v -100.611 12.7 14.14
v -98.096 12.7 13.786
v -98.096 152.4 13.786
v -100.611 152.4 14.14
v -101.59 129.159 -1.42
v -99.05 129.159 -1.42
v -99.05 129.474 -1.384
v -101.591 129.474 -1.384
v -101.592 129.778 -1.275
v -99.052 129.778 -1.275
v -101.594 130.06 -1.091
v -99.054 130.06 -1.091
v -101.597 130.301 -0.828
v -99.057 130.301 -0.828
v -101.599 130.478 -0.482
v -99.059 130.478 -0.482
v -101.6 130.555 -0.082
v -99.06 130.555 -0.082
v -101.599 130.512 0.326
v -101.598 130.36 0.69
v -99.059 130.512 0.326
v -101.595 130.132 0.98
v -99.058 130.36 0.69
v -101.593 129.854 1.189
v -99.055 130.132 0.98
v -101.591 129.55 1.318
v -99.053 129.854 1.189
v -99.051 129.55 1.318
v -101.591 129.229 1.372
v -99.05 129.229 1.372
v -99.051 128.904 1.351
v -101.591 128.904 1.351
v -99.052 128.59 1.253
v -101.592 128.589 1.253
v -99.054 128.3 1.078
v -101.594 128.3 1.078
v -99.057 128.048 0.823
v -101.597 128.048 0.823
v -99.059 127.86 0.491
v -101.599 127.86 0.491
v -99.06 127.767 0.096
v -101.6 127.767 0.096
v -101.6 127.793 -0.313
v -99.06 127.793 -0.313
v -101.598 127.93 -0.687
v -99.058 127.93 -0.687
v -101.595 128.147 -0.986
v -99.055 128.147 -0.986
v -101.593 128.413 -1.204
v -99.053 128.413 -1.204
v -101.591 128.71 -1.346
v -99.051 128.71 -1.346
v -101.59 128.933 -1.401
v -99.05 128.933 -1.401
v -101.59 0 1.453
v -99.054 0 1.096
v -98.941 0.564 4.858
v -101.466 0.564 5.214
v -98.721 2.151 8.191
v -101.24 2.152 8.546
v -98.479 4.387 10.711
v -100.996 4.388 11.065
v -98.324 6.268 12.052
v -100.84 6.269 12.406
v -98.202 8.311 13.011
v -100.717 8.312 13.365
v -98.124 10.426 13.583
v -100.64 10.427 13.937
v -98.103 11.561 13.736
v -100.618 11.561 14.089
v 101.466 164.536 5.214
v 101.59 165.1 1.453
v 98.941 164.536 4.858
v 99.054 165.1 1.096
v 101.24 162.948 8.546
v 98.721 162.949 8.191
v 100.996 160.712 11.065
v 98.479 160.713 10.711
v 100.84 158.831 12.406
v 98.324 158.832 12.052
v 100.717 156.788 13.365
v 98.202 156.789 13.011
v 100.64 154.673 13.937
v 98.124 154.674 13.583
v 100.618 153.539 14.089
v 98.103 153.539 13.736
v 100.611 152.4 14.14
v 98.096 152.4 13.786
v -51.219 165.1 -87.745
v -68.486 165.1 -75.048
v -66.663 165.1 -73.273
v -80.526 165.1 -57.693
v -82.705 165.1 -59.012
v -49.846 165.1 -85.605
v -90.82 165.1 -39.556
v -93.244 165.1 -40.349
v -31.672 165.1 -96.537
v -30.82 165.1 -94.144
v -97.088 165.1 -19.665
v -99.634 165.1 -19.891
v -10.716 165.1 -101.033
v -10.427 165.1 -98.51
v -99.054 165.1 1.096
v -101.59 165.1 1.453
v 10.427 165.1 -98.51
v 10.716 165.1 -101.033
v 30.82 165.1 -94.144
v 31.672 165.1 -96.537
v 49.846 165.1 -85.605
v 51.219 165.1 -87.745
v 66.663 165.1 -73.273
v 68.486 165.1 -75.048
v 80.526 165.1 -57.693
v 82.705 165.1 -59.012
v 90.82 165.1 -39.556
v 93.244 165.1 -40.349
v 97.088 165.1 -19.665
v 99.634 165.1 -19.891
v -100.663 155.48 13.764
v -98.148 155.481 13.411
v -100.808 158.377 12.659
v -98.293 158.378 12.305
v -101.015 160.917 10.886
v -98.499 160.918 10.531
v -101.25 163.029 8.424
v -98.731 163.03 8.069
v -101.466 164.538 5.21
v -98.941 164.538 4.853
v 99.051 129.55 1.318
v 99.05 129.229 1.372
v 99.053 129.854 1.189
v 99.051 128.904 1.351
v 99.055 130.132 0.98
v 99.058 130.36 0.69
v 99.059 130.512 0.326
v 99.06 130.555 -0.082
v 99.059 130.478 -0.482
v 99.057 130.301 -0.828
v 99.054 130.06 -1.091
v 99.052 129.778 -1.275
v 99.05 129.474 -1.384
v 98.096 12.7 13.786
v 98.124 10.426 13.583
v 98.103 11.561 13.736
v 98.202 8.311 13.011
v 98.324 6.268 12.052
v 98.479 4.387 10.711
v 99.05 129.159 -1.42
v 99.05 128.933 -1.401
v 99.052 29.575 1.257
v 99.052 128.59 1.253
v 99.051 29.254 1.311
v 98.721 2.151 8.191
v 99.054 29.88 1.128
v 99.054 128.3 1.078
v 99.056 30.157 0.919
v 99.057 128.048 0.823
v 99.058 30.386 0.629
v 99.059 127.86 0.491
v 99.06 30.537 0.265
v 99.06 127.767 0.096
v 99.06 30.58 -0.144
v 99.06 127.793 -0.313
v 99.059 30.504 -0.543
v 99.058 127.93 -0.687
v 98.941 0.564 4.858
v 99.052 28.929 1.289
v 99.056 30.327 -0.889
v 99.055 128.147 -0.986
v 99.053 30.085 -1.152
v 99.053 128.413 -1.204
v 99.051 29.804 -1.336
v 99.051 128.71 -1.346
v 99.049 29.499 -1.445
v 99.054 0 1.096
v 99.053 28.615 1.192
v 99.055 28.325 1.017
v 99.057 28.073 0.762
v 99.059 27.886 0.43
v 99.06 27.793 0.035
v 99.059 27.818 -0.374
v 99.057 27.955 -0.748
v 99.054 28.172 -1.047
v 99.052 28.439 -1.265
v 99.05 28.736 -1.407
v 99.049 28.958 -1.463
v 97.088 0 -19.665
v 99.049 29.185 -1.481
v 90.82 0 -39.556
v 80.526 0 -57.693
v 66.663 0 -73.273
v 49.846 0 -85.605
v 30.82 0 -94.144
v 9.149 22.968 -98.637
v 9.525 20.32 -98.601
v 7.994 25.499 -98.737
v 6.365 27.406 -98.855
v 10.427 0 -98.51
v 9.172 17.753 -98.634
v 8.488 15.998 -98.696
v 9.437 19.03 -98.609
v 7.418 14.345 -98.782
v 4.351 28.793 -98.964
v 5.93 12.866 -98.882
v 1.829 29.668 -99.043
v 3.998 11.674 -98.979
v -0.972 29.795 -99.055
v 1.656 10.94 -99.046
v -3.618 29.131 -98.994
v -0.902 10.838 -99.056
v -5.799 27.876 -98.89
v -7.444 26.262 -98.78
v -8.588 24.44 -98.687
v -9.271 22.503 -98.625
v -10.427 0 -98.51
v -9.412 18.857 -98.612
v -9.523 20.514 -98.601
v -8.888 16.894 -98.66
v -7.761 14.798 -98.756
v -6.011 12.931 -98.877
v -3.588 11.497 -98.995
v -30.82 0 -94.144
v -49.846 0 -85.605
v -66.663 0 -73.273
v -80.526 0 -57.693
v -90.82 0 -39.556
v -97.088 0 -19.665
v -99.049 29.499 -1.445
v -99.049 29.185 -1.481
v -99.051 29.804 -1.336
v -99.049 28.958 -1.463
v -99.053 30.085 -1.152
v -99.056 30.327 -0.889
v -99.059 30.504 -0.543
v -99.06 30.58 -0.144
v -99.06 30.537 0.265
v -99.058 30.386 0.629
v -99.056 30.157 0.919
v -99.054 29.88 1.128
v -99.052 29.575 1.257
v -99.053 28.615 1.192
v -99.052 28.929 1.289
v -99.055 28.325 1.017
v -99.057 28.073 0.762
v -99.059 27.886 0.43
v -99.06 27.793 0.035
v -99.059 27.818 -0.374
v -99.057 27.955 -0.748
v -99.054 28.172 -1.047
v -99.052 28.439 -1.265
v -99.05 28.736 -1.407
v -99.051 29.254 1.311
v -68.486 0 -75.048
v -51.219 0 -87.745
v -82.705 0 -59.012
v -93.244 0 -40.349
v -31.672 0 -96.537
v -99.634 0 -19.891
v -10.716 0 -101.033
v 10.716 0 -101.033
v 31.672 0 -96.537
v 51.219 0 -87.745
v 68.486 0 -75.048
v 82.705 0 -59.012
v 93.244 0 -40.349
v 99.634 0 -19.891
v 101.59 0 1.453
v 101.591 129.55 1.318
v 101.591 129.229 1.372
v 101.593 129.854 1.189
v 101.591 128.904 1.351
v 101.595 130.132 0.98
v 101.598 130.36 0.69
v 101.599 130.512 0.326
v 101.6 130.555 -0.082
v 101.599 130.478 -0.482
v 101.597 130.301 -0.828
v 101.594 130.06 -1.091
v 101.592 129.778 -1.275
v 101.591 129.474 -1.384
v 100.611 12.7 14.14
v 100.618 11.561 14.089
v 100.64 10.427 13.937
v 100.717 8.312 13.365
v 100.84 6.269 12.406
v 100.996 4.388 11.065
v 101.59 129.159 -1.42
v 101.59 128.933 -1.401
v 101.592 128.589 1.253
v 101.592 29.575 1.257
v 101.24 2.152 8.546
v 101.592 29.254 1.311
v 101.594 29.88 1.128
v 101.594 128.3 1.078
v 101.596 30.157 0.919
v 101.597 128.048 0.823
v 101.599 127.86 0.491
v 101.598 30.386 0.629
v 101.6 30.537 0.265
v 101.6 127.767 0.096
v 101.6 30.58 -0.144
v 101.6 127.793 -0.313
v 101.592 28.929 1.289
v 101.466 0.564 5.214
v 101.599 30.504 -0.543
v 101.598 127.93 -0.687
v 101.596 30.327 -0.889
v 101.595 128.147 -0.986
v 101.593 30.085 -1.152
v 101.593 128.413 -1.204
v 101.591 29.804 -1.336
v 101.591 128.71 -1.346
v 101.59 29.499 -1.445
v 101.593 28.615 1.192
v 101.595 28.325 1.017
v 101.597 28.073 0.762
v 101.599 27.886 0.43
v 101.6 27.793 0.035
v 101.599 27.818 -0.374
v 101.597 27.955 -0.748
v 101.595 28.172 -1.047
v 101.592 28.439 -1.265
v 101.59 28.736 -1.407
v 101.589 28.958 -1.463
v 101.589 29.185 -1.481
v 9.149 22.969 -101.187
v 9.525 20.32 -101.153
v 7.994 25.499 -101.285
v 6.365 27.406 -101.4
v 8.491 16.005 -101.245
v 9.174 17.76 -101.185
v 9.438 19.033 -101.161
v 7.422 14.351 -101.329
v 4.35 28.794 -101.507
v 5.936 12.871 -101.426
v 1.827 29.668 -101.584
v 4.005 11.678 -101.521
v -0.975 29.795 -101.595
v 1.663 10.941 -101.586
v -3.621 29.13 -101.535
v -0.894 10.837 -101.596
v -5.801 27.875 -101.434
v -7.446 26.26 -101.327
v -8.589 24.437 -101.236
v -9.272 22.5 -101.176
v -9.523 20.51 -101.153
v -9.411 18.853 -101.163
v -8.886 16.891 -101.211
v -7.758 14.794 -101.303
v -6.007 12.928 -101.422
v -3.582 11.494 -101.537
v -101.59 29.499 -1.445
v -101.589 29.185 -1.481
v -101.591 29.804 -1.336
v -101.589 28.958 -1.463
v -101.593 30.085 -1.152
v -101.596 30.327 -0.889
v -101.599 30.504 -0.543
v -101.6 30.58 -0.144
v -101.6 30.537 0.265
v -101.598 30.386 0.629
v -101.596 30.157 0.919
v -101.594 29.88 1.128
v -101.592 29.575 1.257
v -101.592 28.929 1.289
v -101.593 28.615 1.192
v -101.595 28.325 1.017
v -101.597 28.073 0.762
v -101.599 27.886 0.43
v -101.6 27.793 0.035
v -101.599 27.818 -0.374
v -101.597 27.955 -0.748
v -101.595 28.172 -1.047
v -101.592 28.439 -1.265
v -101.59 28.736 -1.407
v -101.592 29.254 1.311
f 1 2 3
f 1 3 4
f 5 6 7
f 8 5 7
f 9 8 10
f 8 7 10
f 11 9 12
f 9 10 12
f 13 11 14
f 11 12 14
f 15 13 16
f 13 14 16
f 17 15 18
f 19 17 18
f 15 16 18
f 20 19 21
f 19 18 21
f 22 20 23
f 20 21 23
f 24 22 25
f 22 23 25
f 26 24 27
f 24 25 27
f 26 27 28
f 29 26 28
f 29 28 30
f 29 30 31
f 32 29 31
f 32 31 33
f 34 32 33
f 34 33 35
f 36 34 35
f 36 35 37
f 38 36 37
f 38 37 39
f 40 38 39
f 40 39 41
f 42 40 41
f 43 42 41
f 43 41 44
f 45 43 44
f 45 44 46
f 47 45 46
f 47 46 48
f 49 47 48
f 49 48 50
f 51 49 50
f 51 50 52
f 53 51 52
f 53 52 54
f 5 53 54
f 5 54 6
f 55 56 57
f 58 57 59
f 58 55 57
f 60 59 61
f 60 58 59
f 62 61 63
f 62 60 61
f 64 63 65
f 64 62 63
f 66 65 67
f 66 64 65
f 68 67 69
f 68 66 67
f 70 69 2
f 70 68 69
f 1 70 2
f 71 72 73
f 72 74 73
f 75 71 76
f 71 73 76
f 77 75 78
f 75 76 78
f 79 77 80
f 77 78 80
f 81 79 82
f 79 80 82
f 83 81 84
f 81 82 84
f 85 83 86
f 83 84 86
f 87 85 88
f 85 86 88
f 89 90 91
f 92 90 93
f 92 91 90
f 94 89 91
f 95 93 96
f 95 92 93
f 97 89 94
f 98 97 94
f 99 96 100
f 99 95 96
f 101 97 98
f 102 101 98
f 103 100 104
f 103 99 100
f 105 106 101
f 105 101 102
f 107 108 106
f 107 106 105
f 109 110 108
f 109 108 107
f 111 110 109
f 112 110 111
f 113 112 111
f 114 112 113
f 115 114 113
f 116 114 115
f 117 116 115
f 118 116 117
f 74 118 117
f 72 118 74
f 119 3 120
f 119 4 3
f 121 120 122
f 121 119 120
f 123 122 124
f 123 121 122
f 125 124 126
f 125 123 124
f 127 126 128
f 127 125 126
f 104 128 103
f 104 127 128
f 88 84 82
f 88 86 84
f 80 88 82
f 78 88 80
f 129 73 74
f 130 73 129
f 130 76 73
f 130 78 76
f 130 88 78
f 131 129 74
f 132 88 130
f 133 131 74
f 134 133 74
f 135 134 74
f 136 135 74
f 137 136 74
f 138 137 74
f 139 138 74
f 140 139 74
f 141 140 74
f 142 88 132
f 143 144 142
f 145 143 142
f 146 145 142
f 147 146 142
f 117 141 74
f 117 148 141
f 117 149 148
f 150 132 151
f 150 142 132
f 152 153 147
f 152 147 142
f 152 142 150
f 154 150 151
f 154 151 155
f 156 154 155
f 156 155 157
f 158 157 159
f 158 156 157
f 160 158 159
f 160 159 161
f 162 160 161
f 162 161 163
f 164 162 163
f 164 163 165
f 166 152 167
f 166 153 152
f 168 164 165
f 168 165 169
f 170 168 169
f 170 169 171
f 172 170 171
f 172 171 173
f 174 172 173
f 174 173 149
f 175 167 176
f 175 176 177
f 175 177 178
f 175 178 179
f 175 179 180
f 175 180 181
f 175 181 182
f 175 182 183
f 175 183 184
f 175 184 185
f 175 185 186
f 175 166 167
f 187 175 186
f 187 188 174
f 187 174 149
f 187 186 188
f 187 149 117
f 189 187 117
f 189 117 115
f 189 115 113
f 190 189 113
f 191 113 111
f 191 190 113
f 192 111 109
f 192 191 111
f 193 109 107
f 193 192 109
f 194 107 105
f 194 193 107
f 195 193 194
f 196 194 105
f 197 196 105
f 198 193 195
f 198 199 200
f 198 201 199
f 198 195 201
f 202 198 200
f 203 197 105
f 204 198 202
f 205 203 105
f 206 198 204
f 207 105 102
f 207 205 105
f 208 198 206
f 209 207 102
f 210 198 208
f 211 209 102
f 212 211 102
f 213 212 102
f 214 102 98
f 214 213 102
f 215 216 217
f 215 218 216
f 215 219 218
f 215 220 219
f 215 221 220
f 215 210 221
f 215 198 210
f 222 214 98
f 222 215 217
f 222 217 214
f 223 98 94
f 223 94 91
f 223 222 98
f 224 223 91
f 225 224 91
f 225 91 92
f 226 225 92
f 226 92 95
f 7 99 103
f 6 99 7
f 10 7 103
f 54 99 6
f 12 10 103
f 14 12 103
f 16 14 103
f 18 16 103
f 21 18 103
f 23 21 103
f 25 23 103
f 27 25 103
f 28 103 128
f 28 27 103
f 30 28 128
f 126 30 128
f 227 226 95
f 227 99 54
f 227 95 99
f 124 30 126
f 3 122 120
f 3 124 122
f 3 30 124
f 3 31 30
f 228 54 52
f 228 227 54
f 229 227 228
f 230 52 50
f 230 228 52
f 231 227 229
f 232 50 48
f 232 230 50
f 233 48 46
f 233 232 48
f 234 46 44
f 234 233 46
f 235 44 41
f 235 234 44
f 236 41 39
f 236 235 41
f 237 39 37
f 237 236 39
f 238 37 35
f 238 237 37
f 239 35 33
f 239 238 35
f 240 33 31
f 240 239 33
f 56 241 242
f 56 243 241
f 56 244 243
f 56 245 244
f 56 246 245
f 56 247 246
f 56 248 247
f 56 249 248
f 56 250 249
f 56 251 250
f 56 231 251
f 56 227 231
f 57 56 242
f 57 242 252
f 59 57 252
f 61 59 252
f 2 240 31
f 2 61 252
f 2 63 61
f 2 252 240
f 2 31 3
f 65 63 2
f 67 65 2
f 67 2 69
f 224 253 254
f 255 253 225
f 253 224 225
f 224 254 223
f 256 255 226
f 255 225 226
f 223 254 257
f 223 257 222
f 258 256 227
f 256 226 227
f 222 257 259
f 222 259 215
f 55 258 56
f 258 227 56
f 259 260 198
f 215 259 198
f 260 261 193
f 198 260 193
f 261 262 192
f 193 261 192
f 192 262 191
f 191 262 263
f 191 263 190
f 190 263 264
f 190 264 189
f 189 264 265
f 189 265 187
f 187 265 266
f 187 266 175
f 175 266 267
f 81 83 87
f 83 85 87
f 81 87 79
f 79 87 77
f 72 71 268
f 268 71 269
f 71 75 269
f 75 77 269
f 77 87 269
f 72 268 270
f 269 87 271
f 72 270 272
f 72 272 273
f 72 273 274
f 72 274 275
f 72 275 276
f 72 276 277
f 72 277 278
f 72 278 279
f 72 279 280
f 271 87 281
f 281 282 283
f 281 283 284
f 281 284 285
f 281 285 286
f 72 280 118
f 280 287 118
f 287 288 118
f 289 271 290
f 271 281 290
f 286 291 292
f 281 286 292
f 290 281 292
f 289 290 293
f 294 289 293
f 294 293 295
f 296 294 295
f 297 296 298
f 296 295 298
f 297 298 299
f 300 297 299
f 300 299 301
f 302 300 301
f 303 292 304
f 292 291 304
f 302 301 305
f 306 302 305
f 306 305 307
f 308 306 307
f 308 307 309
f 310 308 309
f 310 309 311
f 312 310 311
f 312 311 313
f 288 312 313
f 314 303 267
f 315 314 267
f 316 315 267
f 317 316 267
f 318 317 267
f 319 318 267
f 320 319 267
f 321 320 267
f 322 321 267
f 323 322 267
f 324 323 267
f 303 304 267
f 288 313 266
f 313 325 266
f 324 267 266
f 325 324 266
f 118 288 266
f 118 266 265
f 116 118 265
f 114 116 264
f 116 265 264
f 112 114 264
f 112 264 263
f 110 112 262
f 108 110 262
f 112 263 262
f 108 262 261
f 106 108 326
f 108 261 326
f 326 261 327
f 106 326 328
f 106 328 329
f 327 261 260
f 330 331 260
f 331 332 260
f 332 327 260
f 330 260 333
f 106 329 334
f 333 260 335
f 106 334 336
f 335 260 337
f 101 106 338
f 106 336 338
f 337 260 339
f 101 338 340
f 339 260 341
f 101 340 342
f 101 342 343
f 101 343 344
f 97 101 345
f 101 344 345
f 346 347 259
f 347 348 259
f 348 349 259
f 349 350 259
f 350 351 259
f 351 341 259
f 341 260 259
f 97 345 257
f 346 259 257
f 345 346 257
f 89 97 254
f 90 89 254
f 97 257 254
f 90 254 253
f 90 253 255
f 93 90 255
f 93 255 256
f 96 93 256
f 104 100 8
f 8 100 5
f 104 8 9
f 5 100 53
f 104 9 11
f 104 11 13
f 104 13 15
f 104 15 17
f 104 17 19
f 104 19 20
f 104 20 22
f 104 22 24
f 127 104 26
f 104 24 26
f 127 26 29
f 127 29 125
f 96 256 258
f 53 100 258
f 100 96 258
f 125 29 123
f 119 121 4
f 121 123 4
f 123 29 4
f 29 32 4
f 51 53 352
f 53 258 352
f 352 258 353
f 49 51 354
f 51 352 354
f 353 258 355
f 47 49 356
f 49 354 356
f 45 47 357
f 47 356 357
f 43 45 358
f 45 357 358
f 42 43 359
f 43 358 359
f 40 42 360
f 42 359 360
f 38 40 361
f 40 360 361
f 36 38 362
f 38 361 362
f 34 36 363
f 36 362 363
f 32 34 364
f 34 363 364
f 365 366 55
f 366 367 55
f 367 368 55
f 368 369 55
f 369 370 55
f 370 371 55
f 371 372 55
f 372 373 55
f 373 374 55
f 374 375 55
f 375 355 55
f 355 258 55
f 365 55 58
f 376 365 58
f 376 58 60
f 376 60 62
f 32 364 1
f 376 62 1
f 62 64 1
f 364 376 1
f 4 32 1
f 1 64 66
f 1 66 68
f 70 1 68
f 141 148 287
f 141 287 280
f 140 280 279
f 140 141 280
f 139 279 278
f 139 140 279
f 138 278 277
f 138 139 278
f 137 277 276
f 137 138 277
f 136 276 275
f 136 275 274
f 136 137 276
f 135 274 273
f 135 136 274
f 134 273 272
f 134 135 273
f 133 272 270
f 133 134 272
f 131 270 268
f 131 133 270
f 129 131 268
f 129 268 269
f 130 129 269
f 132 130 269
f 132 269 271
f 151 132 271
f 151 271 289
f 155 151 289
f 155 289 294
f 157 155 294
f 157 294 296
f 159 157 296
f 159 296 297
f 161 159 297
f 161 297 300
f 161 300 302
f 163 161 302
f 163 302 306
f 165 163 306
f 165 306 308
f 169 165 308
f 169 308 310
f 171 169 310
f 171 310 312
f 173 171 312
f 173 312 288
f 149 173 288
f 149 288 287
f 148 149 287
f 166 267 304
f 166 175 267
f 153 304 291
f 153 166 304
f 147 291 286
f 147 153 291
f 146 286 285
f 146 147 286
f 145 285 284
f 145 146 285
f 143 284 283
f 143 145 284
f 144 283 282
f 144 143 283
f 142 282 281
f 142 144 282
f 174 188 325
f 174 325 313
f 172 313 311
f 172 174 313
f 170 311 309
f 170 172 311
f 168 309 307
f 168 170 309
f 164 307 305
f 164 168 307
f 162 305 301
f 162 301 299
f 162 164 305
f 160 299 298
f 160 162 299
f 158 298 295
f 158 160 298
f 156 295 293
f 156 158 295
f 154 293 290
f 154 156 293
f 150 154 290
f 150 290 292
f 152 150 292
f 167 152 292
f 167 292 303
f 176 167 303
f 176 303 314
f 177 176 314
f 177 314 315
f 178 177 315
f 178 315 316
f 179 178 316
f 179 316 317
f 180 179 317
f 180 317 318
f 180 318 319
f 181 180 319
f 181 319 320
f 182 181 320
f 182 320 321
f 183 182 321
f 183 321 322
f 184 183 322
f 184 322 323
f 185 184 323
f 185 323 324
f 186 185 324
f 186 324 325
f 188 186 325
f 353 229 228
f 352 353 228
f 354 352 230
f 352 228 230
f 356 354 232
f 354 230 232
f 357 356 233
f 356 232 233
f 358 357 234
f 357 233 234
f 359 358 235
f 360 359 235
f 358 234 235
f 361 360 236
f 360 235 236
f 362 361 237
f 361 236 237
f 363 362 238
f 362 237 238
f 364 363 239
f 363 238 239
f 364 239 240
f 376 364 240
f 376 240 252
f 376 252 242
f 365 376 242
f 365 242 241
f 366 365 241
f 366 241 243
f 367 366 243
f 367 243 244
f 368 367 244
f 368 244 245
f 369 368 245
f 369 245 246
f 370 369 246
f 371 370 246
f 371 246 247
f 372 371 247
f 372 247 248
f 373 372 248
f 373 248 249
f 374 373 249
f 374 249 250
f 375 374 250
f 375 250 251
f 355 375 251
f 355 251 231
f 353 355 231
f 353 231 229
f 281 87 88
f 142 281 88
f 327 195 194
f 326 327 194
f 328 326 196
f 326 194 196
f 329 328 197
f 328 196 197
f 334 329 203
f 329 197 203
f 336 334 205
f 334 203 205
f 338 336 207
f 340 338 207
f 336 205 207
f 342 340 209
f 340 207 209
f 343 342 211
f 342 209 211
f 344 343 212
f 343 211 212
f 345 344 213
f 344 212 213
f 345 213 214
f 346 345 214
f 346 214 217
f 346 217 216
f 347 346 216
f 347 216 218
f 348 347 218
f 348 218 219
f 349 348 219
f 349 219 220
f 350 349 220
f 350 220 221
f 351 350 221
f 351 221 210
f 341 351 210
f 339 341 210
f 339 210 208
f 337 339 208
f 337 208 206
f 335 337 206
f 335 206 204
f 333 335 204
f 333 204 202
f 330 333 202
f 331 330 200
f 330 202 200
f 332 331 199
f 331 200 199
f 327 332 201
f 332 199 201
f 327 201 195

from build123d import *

# Parameters (mm, degrees)
SKETCH1_R               = 101.6
SKETCH1_R_2             = 99.06
BOSS_EXTRUDE1_DEPTH     = 165.1
CUT_EXTRUDE1_DEPTH      = 165.1
FILLET1_R               = 12.7
SKETCH3_R               = 1.397
CUT_EXTRUDE2_DEPTH      = 219.867837001
CUT_EXTRUDE2_DEPTH_BACK = 219.867837001
SKETCH4_R               = 9.525
CUT_EXTRUDE3_DEPTH      = 219.867837003


with BuildPart() as part:
    # Sketch1 → Boss-Extrude1 (new body)
    with BuildSketch(Plane(origin=(0, 0, 0), x_dir=(1, 0, 0), z_dir=(0, 1, 0))):
        with Locations(Location((0, 0, 0), (0, 0, 270))):
            Circle(SKETCH1_R)
        with Locations(Location((0, 0, 0), (0, 0, 270))):
            Circle(SKETCH1_R_2, mode=Mode.SUBTRACT)
    extrude(amount=BOSS_EXTRUDE1_DEPTH)

    # Sketch2 → Cut-Extrude1 (cut)
    with BuildSketch(Plane(origin=(0, 0, 0), x_dir=(1, 0, 0), z_dir=(0, 1, 0))):
        Polygon((571.962381958, -80.384070579), (100.611235784, -14.139987058), (0, 0), (-100.611235784, -14.139987058), (-571.962381958, -80.384070579), (-571.962381958, -1032.350838067), (571.962381958, -1032.350838067), align=None)
    extrude(amount=CUT_EXTRUDE1_DEPTH, mode=Mode.SUBTRACT)

    # Fillet1
    fillet1_edges = [part.edges().sort_by_distance(p)[0] for p in [
        (-99.353595337, 0, 13.963237219),
        (99.353595337, 165.1, 13.963237219),
        (-99.353595337, 165.1, 13.963237219),
        (99.353595337, 0, 13.963237219),
    ]]
    fillet(fillet1_edges, radius=FILLET1_R)

    # Sketch3 → Cut-Extrude2 (cut, two sides)
    with BuildSketch(Plane(origin=(0, 0, 0), x_dir=(0, 0, -1), z_dir=(1, 0, 0))) as cut_extrude2_sk:
        with Locations((0.084012942, 29.1846)):
            Circle(SKETCH3_R)
        with Locations((0.022897636, 129.159100035)):
            Circle(SKETCH3_R)
    extrude(amount=CUT_EXTRUDE2_DEPTH, mode=Mode.SUBTRACT)
    extrude(cut_extrude2_sk.sketch, amount=-CUT_EXTRUDE2_DEPTH_BACK, mode=Mode.SUBTRACT)

    # Sketch4 → Cut-Extrude3 (cut, through all)
    with BuildSketch(Plane.XY):
        with Locations((0, 20.32)):
            Circle(SKETCH4_R)
    extrude(amount=-CUT_EXTRUDE3_DEPTH, mode=Mode.SUBTRACT)


solid = part.part
